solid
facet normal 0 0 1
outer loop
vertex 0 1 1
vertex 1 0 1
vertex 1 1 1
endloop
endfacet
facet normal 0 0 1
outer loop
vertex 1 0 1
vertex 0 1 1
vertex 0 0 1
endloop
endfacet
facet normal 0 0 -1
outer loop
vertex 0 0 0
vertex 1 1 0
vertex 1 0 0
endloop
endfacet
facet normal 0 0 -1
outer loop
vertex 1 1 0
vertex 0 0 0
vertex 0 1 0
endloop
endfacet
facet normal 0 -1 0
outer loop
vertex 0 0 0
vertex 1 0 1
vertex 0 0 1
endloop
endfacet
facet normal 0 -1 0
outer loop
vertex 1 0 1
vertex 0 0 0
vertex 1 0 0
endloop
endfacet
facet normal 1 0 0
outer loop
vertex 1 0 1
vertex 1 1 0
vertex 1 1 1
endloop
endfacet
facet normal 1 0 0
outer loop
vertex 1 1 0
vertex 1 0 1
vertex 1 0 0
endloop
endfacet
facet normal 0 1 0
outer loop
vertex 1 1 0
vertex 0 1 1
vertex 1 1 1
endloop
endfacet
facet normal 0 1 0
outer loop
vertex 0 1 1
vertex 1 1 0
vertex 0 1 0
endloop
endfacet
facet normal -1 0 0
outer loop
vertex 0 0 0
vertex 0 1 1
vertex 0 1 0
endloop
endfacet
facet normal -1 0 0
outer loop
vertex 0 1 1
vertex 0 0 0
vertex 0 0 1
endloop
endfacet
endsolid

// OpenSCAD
// Copied from https://en.wikibooks.org/wiki/OpenSCAD_User_Manual/Customizer

// A variable which comes first before the tabs
VariableBeforeFirstTab = 1;

/* [Drop down box:] */
// combo box for number
Numbers=2; // [0, 1, 2, 3]

// combo box for string
Strings="foo"; // [foo, bar, baz]

//labeled combo box for numbers
Labeled_values=10; // [10:L, 20:M, 30:XL]

//labeled combo box for string
Labeled_value="S"; // [S:Small, M:Medium, L:Large]

/*[ Slider ]*/
// slider widget for number
slider =34; // [10:100]

//step slider for number
stepSlider=2; //[0:5:100]

/* [Checkbox] */

//description
Variable = true;

/*[Spinbox] */

// spinbox with step size 1
Spinbox = 5;

/* [Textbox] */

//Text box for vector with more than 4 elements
Vector6=[12,34,44,43,23,23];

// Text box for string
String="hello";

/* [Special vector] */
//Text box for vector with less than or equal to 4 elements
Vector1=[12]; //[0:2:50]
Vector2=[12,34]; //[0:2:50]
Vector3=[12,34,46]; //[0:2:50]
Vector4=[12,34,46,24]; //[0:2:50]

cube();
